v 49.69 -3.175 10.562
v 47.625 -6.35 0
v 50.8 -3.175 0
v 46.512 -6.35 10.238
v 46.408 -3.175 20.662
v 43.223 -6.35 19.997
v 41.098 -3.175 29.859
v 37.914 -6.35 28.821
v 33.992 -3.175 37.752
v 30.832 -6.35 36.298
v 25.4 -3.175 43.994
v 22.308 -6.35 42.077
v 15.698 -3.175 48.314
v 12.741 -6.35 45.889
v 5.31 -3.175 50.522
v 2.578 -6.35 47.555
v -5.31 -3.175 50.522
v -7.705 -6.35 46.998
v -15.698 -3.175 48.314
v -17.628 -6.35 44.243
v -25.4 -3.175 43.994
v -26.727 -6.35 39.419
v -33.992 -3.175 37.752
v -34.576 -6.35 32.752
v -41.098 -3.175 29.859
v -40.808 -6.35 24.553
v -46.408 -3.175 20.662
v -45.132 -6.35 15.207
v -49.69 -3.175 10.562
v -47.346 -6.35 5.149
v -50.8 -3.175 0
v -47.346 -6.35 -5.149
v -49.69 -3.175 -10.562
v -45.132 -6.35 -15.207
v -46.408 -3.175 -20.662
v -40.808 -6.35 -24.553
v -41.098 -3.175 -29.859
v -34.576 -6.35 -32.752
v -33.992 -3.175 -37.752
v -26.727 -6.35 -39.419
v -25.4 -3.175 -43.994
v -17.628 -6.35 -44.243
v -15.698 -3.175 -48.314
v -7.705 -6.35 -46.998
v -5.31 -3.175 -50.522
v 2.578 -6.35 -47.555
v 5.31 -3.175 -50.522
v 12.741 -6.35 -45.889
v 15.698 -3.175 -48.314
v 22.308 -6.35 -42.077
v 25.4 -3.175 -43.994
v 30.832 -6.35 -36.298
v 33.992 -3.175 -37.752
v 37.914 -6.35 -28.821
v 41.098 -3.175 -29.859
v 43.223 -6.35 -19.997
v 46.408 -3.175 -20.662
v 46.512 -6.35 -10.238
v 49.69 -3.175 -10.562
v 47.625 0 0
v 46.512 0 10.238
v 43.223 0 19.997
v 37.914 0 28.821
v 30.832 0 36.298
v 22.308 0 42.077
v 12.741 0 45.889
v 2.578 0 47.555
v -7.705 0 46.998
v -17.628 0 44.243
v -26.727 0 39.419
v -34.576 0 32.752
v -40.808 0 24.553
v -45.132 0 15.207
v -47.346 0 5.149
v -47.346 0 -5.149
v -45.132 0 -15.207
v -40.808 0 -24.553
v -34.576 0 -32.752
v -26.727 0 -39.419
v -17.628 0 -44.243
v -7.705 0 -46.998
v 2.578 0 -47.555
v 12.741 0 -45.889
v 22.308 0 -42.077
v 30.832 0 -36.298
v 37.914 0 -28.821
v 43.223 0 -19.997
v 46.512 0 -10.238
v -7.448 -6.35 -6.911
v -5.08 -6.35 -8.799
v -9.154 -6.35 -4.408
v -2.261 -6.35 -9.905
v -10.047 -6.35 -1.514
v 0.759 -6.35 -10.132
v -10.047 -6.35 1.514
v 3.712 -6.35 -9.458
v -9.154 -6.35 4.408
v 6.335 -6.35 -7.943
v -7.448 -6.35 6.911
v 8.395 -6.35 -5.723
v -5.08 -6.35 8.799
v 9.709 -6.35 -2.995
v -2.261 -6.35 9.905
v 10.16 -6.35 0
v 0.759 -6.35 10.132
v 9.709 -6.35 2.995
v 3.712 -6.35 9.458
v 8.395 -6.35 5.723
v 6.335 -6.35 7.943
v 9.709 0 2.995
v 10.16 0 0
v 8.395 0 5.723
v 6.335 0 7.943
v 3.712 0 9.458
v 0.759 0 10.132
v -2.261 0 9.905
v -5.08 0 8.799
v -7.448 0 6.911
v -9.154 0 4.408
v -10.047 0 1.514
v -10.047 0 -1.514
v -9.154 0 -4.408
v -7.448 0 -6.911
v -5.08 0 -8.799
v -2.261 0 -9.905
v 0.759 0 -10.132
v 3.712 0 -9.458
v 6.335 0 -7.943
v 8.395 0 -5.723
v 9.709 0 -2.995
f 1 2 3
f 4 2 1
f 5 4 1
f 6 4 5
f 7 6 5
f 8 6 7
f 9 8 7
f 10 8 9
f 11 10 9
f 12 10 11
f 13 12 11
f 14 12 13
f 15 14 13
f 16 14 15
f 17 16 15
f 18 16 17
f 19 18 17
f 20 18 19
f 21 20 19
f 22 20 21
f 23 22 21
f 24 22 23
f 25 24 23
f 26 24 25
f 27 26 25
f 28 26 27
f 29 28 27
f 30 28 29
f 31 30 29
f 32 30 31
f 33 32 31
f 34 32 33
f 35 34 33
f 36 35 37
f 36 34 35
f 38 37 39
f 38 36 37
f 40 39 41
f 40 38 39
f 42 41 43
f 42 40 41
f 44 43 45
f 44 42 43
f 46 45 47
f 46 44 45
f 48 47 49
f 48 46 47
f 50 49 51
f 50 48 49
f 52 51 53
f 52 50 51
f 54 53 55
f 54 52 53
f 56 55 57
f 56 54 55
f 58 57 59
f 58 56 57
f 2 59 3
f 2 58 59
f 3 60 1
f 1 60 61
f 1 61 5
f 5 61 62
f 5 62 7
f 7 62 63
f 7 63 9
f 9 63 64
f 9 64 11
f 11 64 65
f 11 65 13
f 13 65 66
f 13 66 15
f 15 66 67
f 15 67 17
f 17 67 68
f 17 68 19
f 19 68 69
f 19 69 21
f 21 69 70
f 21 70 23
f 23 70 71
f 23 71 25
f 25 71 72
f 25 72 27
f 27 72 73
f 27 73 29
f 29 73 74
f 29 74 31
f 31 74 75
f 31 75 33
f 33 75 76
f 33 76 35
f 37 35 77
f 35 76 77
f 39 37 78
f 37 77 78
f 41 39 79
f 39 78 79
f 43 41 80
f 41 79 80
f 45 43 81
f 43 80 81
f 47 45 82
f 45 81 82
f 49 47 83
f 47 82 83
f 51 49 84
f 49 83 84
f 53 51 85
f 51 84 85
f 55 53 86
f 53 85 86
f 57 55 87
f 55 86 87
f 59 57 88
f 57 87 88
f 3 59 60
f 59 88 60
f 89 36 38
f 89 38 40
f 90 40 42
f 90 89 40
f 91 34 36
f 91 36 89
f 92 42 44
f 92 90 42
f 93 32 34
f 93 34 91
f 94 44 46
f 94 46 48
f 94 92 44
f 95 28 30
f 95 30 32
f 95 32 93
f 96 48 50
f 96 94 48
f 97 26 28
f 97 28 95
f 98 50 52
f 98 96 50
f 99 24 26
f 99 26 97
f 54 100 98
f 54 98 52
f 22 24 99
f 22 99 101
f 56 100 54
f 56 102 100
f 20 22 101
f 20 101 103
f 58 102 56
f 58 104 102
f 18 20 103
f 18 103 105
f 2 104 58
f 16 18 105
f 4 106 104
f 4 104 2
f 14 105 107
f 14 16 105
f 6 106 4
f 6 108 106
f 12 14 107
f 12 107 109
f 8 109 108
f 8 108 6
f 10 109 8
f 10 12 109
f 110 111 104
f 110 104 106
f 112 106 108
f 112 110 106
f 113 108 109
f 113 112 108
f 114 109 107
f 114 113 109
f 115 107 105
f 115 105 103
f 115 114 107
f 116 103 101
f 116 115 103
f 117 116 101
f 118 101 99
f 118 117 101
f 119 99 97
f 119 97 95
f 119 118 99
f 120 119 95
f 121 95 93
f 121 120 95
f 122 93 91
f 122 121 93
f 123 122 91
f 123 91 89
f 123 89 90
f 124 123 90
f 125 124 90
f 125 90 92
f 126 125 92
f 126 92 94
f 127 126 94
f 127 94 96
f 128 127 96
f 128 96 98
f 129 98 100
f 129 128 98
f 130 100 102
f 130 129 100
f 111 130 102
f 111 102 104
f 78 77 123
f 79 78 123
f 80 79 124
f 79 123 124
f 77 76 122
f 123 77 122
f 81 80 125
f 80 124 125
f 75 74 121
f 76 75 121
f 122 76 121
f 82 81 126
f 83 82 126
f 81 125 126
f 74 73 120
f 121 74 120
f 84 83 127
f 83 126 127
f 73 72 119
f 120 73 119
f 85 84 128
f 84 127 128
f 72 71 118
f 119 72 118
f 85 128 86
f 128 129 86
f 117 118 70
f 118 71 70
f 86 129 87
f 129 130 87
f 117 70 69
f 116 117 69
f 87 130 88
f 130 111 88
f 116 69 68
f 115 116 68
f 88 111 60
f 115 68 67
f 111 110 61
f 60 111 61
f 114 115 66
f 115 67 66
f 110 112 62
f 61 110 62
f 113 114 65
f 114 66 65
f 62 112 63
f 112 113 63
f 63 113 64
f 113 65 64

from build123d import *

# Parameters (mm, degrees)
F0_R     = 50.8
F0_R_2   = 10.16
F1_DEPTH = 6.35
F2_SIZE  = 3.175
F3_SIZE  = 3.17499


# Not quite as in the source:
# - a fillet or chamfer is up to 0.001 mm smaller than in the source, because OpenCascade refuses the exact size


with BuildPart() as f1:
    # F0 (on Front) → F1 (new body)
    with BuildSketch(Plane.XZ):
        Circle(F0_R)
        Circle(F0_R_2, mode=Mode.SUBTRACT)
    extrude(amount=F1_DEPTH)

    # F2
    f2_edges = [f1.edges().sort_by_distance(p)[0] for p in [
        (-50.8, -6.35, 0),
    ]]
    chamfer(f2_edges, length=F2_SIZE)

    # F3 (size 3.175 in the source; OpenCascade refuses exactly that, so slightly less here)
    f3_edges = [f1.edges().sort_by_distance(p)[0] for p in [
        (-50.8, 0, 0),
    ]]
    chamfer(f3_edges, length=F3_SIZE)


solid = f1.part
